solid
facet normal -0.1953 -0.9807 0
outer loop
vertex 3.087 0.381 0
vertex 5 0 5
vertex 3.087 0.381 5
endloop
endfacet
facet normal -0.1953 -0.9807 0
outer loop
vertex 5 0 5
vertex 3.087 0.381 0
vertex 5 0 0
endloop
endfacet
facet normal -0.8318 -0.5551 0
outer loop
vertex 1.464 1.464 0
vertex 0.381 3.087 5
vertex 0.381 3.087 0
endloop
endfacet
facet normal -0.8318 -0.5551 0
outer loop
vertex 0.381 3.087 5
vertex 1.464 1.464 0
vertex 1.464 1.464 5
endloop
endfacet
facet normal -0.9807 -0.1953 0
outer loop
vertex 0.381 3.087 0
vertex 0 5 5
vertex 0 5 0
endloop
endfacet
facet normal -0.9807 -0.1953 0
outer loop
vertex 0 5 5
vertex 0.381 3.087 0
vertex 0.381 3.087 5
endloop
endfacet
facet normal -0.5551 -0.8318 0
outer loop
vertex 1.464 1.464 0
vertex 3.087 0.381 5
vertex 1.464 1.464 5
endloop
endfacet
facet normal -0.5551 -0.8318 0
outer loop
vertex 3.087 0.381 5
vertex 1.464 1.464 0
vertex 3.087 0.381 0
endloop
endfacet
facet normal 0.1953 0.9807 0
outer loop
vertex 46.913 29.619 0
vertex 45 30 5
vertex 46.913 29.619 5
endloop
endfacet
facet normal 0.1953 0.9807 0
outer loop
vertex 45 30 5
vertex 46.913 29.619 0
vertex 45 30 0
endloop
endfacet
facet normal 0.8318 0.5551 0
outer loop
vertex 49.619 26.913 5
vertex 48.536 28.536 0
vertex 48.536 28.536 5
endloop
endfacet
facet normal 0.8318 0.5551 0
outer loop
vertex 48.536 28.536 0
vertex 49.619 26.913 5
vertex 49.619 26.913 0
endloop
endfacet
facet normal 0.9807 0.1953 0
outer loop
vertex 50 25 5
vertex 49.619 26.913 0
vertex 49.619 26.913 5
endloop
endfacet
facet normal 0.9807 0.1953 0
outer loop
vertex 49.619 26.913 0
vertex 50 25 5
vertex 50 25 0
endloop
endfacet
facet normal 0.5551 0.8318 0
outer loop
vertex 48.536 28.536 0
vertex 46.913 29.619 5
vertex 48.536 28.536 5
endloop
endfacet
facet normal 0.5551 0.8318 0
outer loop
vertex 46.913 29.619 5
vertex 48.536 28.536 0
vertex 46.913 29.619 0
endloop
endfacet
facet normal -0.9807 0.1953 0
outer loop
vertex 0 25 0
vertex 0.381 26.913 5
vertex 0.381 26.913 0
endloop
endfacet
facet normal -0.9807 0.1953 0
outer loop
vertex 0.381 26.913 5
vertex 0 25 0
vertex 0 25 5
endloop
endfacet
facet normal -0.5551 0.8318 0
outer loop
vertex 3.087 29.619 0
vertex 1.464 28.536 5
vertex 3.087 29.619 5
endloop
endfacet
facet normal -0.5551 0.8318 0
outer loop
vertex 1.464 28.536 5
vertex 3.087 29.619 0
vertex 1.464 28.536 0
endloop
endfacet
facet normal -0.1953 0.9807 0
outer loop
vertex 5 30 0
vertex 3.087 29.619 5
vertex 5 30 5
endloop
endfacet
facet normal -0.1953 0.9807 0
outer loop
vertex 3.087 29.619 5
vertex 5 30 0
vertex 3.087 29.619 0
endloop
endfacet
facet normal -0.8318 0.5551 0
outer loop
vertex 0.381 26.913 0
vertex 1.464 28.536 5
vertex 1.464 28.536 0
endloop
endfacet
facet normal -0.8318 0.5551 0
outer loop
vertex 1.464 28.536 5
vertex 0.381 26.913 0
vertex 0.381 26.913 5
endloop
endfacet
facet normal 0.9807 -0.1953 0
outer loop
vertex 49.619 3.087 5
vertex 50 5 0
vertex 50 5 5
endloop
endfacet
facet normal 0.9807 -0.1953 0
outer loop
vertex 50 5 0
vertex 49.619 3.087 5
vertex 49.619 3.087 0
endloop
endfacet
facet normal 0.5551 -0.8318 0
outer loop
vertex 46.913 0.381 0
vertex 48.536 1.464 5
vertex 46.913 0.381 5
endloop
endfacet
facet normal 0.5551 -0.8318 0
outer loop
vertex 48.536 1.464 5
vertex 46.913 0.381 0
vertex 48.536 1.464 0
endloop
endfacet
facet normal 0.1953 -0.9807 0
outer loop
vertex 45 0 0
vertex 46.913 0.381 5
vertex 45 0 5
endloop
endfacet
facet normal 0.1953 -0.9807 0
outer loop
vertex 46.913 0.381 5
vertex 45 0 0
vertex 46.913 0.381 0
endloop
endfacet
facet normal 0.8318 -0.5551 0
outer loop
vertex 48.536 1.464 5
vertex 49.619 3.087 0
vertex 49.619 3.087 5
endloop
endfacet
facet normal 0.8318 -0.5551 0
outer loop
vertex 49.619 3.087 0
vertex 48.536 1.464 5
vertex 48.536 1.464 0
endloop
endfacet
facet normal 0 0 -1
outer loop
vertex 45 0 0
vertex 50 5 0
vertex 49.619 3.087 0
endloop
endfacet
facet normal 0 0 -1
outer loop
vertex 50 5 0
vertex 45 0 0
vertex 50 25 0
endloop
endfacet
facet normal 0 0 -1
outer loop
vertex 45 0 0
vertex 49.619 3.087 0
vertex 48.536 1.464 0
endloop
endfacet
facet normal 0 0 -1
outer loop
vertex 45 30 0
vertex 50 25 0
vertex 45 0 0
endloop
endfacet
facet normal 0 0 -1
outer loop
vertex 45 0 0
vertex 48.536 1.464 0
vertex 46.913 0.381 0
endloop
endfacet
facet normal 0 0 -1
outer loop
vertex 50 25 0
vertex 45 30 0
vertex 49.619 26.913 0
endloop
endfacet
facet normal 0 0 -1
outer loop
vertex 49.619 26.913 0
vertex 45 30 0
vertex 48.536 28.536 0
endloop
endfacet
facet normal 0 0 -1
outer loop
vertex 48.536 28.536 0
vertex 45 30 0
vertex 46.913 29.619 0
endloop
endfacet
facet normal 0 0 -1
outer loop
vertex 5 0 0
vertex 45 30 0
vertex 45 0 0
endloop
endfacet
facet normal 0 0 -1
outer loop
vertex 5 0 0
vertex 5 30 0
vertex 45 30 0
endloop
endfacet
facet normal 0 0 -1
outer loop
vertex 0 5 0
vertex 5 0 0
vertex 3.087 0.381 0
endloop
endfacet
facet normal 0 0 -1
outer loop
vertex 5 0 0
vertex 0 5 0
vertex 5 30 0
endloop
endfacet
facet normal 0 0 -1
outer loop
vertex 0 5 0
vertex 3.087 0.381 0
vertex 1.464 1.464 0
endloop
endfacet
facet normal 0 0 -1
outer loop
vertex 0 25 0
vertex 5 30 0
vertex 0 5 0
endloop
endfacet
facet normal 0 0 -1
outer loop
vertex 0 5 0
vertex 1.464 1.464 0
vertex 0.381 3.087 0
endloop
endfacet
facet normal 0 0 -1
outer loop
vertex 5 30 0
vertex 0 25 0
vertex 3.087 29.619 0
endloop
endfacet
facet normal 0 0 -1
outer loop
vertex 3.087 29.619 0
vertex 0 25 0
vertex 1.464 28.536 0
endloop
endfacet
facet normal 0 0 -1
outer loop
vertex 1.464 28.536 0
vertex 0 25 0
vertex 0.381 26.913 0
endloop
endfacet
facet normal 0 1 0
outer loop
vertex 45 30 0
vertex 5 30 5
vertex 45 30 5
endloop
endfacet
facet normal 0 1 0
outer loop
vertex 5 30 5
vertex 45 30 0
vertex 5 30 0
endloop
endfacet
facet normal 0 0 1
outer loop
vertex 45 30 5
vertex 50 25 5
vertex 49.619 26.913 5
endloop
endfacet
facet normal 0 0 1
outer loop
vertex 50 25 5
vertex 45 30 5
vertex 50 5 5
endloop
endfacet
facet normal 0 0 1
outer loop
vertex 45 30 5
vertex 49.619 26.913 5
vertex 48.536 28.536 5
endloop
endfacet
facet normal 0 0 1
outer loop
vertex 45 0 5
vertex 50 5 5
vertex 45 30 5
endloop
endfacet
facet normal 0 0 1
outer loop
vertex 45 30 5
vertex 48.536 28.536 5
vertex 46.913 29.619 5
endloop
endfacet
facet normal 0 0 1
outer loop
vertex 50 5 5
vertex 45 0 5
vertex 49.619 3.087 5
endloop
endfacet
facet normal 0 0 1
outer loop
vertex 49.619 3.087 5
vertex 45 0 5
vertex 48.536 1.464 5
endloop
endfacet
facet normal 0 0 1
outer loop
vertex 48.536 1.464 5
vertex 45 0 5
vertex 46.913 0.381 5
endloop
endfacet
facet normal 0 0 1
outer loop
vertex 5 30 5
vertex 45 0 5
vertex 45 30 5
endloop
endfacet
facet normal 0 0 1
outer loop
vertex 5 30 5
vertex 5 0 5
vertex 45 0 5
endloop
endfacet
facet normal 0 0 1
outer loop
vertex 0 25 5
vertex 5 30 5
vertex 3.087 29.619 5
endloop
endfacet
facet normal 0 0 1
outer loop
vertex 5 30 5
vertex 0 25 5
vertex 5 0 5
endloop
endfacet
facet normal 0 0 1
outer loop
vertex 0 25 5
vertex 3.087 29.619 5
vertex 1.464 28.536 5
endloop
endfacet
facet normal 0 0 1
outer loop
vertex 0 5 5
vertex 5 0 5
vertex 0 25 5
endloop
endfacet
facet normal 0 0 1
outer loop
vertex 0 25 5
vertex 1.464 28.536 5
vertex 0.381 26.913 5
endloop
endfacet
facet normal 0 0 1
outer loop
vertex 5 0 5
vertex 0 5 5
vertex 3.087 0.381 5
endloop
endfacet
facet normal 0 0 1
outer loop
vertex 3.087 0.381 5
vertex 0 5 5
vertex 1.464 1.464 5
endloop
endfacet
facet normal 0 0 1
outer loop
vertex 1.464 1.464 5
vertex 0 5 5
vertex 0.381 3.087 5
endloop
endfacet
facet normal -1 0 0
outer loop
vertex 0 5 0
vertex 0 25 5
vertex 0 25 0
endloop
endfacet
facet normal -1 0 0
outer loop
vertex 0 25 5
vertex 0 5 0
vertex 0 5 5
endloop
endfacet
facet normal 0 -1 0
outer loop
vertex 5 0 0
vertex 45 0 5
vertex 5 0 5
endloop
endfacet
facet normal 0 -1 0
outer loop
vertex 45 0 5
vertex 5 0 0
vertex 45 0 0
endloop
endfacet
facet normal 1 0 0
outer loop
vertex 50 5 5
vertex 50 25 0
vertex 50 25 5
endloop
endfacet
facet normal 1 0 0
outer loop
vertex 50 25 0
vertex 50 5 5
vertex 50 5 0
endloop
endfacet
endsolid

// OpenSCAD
// file: box.scad
module box(w, l, h){
    polyhedron(
        points=[
            // lowest layer
            [0, 0, 0],
            [0, w, 0],
            [l, w, 0],
            [l, 0, 0],

            // top layer
            [0, 0, h],
            [0, w, h],
            [l, w, h],
            [l, 0, h]
        ],
        faces=[
            // bottom
            [0, 3, 2, 1],

            // sides beginning with front
            [0, 1, 5, 4],
            [1, 2, 6, 5],
            [3, 7, 6, 2],
            [0, 4, 7, 3],

            // top
            [4, 5, 6, 7]
        ]
    );
}

box(30, 50, 5);
// main file
use <box.scad>;

module box_rounded(w, l, h, r) {
    difference() {
        box(w, l, h);

        translate([l, w, 0]) rotate([0, 0, 180]) difference() {
            translate([0, 0, h / 2]) cube([2*r, 2*r, 2*h], center = true);
            translate([r, r, h / 2]) cylinder(h = 3*h, r = r, center = true);
        }

        translate([0, w, 0]) rotate([0, 0, 270]) difference() {
            translate([0, 0, h / 2]) cube([2*r, 2*r, 2*h], center = true);
            translate([r, r, h / 2]) cylinder(h = 3*h, r = r, center = true);
        }

        translate([l, 0, 0]) rotate([0, 0, 90]) difference() {
            translate([0, 0, h / 2]) cube([2*r, 2*r, 2*h], center = true);
            translate([r, r, h / 2]) cylinder(h = 3*h, r = r, center = true);
        }

        difference() {
            translate([0, 0, h / 2]) cube([2*r, 2*r, 2*h], center = true);
            translate([r, r, h / 2]) cylinder(h = 3*h, r = r, center = true);
        }
    }
}

box_rounded(30, 50, 5, 5);
